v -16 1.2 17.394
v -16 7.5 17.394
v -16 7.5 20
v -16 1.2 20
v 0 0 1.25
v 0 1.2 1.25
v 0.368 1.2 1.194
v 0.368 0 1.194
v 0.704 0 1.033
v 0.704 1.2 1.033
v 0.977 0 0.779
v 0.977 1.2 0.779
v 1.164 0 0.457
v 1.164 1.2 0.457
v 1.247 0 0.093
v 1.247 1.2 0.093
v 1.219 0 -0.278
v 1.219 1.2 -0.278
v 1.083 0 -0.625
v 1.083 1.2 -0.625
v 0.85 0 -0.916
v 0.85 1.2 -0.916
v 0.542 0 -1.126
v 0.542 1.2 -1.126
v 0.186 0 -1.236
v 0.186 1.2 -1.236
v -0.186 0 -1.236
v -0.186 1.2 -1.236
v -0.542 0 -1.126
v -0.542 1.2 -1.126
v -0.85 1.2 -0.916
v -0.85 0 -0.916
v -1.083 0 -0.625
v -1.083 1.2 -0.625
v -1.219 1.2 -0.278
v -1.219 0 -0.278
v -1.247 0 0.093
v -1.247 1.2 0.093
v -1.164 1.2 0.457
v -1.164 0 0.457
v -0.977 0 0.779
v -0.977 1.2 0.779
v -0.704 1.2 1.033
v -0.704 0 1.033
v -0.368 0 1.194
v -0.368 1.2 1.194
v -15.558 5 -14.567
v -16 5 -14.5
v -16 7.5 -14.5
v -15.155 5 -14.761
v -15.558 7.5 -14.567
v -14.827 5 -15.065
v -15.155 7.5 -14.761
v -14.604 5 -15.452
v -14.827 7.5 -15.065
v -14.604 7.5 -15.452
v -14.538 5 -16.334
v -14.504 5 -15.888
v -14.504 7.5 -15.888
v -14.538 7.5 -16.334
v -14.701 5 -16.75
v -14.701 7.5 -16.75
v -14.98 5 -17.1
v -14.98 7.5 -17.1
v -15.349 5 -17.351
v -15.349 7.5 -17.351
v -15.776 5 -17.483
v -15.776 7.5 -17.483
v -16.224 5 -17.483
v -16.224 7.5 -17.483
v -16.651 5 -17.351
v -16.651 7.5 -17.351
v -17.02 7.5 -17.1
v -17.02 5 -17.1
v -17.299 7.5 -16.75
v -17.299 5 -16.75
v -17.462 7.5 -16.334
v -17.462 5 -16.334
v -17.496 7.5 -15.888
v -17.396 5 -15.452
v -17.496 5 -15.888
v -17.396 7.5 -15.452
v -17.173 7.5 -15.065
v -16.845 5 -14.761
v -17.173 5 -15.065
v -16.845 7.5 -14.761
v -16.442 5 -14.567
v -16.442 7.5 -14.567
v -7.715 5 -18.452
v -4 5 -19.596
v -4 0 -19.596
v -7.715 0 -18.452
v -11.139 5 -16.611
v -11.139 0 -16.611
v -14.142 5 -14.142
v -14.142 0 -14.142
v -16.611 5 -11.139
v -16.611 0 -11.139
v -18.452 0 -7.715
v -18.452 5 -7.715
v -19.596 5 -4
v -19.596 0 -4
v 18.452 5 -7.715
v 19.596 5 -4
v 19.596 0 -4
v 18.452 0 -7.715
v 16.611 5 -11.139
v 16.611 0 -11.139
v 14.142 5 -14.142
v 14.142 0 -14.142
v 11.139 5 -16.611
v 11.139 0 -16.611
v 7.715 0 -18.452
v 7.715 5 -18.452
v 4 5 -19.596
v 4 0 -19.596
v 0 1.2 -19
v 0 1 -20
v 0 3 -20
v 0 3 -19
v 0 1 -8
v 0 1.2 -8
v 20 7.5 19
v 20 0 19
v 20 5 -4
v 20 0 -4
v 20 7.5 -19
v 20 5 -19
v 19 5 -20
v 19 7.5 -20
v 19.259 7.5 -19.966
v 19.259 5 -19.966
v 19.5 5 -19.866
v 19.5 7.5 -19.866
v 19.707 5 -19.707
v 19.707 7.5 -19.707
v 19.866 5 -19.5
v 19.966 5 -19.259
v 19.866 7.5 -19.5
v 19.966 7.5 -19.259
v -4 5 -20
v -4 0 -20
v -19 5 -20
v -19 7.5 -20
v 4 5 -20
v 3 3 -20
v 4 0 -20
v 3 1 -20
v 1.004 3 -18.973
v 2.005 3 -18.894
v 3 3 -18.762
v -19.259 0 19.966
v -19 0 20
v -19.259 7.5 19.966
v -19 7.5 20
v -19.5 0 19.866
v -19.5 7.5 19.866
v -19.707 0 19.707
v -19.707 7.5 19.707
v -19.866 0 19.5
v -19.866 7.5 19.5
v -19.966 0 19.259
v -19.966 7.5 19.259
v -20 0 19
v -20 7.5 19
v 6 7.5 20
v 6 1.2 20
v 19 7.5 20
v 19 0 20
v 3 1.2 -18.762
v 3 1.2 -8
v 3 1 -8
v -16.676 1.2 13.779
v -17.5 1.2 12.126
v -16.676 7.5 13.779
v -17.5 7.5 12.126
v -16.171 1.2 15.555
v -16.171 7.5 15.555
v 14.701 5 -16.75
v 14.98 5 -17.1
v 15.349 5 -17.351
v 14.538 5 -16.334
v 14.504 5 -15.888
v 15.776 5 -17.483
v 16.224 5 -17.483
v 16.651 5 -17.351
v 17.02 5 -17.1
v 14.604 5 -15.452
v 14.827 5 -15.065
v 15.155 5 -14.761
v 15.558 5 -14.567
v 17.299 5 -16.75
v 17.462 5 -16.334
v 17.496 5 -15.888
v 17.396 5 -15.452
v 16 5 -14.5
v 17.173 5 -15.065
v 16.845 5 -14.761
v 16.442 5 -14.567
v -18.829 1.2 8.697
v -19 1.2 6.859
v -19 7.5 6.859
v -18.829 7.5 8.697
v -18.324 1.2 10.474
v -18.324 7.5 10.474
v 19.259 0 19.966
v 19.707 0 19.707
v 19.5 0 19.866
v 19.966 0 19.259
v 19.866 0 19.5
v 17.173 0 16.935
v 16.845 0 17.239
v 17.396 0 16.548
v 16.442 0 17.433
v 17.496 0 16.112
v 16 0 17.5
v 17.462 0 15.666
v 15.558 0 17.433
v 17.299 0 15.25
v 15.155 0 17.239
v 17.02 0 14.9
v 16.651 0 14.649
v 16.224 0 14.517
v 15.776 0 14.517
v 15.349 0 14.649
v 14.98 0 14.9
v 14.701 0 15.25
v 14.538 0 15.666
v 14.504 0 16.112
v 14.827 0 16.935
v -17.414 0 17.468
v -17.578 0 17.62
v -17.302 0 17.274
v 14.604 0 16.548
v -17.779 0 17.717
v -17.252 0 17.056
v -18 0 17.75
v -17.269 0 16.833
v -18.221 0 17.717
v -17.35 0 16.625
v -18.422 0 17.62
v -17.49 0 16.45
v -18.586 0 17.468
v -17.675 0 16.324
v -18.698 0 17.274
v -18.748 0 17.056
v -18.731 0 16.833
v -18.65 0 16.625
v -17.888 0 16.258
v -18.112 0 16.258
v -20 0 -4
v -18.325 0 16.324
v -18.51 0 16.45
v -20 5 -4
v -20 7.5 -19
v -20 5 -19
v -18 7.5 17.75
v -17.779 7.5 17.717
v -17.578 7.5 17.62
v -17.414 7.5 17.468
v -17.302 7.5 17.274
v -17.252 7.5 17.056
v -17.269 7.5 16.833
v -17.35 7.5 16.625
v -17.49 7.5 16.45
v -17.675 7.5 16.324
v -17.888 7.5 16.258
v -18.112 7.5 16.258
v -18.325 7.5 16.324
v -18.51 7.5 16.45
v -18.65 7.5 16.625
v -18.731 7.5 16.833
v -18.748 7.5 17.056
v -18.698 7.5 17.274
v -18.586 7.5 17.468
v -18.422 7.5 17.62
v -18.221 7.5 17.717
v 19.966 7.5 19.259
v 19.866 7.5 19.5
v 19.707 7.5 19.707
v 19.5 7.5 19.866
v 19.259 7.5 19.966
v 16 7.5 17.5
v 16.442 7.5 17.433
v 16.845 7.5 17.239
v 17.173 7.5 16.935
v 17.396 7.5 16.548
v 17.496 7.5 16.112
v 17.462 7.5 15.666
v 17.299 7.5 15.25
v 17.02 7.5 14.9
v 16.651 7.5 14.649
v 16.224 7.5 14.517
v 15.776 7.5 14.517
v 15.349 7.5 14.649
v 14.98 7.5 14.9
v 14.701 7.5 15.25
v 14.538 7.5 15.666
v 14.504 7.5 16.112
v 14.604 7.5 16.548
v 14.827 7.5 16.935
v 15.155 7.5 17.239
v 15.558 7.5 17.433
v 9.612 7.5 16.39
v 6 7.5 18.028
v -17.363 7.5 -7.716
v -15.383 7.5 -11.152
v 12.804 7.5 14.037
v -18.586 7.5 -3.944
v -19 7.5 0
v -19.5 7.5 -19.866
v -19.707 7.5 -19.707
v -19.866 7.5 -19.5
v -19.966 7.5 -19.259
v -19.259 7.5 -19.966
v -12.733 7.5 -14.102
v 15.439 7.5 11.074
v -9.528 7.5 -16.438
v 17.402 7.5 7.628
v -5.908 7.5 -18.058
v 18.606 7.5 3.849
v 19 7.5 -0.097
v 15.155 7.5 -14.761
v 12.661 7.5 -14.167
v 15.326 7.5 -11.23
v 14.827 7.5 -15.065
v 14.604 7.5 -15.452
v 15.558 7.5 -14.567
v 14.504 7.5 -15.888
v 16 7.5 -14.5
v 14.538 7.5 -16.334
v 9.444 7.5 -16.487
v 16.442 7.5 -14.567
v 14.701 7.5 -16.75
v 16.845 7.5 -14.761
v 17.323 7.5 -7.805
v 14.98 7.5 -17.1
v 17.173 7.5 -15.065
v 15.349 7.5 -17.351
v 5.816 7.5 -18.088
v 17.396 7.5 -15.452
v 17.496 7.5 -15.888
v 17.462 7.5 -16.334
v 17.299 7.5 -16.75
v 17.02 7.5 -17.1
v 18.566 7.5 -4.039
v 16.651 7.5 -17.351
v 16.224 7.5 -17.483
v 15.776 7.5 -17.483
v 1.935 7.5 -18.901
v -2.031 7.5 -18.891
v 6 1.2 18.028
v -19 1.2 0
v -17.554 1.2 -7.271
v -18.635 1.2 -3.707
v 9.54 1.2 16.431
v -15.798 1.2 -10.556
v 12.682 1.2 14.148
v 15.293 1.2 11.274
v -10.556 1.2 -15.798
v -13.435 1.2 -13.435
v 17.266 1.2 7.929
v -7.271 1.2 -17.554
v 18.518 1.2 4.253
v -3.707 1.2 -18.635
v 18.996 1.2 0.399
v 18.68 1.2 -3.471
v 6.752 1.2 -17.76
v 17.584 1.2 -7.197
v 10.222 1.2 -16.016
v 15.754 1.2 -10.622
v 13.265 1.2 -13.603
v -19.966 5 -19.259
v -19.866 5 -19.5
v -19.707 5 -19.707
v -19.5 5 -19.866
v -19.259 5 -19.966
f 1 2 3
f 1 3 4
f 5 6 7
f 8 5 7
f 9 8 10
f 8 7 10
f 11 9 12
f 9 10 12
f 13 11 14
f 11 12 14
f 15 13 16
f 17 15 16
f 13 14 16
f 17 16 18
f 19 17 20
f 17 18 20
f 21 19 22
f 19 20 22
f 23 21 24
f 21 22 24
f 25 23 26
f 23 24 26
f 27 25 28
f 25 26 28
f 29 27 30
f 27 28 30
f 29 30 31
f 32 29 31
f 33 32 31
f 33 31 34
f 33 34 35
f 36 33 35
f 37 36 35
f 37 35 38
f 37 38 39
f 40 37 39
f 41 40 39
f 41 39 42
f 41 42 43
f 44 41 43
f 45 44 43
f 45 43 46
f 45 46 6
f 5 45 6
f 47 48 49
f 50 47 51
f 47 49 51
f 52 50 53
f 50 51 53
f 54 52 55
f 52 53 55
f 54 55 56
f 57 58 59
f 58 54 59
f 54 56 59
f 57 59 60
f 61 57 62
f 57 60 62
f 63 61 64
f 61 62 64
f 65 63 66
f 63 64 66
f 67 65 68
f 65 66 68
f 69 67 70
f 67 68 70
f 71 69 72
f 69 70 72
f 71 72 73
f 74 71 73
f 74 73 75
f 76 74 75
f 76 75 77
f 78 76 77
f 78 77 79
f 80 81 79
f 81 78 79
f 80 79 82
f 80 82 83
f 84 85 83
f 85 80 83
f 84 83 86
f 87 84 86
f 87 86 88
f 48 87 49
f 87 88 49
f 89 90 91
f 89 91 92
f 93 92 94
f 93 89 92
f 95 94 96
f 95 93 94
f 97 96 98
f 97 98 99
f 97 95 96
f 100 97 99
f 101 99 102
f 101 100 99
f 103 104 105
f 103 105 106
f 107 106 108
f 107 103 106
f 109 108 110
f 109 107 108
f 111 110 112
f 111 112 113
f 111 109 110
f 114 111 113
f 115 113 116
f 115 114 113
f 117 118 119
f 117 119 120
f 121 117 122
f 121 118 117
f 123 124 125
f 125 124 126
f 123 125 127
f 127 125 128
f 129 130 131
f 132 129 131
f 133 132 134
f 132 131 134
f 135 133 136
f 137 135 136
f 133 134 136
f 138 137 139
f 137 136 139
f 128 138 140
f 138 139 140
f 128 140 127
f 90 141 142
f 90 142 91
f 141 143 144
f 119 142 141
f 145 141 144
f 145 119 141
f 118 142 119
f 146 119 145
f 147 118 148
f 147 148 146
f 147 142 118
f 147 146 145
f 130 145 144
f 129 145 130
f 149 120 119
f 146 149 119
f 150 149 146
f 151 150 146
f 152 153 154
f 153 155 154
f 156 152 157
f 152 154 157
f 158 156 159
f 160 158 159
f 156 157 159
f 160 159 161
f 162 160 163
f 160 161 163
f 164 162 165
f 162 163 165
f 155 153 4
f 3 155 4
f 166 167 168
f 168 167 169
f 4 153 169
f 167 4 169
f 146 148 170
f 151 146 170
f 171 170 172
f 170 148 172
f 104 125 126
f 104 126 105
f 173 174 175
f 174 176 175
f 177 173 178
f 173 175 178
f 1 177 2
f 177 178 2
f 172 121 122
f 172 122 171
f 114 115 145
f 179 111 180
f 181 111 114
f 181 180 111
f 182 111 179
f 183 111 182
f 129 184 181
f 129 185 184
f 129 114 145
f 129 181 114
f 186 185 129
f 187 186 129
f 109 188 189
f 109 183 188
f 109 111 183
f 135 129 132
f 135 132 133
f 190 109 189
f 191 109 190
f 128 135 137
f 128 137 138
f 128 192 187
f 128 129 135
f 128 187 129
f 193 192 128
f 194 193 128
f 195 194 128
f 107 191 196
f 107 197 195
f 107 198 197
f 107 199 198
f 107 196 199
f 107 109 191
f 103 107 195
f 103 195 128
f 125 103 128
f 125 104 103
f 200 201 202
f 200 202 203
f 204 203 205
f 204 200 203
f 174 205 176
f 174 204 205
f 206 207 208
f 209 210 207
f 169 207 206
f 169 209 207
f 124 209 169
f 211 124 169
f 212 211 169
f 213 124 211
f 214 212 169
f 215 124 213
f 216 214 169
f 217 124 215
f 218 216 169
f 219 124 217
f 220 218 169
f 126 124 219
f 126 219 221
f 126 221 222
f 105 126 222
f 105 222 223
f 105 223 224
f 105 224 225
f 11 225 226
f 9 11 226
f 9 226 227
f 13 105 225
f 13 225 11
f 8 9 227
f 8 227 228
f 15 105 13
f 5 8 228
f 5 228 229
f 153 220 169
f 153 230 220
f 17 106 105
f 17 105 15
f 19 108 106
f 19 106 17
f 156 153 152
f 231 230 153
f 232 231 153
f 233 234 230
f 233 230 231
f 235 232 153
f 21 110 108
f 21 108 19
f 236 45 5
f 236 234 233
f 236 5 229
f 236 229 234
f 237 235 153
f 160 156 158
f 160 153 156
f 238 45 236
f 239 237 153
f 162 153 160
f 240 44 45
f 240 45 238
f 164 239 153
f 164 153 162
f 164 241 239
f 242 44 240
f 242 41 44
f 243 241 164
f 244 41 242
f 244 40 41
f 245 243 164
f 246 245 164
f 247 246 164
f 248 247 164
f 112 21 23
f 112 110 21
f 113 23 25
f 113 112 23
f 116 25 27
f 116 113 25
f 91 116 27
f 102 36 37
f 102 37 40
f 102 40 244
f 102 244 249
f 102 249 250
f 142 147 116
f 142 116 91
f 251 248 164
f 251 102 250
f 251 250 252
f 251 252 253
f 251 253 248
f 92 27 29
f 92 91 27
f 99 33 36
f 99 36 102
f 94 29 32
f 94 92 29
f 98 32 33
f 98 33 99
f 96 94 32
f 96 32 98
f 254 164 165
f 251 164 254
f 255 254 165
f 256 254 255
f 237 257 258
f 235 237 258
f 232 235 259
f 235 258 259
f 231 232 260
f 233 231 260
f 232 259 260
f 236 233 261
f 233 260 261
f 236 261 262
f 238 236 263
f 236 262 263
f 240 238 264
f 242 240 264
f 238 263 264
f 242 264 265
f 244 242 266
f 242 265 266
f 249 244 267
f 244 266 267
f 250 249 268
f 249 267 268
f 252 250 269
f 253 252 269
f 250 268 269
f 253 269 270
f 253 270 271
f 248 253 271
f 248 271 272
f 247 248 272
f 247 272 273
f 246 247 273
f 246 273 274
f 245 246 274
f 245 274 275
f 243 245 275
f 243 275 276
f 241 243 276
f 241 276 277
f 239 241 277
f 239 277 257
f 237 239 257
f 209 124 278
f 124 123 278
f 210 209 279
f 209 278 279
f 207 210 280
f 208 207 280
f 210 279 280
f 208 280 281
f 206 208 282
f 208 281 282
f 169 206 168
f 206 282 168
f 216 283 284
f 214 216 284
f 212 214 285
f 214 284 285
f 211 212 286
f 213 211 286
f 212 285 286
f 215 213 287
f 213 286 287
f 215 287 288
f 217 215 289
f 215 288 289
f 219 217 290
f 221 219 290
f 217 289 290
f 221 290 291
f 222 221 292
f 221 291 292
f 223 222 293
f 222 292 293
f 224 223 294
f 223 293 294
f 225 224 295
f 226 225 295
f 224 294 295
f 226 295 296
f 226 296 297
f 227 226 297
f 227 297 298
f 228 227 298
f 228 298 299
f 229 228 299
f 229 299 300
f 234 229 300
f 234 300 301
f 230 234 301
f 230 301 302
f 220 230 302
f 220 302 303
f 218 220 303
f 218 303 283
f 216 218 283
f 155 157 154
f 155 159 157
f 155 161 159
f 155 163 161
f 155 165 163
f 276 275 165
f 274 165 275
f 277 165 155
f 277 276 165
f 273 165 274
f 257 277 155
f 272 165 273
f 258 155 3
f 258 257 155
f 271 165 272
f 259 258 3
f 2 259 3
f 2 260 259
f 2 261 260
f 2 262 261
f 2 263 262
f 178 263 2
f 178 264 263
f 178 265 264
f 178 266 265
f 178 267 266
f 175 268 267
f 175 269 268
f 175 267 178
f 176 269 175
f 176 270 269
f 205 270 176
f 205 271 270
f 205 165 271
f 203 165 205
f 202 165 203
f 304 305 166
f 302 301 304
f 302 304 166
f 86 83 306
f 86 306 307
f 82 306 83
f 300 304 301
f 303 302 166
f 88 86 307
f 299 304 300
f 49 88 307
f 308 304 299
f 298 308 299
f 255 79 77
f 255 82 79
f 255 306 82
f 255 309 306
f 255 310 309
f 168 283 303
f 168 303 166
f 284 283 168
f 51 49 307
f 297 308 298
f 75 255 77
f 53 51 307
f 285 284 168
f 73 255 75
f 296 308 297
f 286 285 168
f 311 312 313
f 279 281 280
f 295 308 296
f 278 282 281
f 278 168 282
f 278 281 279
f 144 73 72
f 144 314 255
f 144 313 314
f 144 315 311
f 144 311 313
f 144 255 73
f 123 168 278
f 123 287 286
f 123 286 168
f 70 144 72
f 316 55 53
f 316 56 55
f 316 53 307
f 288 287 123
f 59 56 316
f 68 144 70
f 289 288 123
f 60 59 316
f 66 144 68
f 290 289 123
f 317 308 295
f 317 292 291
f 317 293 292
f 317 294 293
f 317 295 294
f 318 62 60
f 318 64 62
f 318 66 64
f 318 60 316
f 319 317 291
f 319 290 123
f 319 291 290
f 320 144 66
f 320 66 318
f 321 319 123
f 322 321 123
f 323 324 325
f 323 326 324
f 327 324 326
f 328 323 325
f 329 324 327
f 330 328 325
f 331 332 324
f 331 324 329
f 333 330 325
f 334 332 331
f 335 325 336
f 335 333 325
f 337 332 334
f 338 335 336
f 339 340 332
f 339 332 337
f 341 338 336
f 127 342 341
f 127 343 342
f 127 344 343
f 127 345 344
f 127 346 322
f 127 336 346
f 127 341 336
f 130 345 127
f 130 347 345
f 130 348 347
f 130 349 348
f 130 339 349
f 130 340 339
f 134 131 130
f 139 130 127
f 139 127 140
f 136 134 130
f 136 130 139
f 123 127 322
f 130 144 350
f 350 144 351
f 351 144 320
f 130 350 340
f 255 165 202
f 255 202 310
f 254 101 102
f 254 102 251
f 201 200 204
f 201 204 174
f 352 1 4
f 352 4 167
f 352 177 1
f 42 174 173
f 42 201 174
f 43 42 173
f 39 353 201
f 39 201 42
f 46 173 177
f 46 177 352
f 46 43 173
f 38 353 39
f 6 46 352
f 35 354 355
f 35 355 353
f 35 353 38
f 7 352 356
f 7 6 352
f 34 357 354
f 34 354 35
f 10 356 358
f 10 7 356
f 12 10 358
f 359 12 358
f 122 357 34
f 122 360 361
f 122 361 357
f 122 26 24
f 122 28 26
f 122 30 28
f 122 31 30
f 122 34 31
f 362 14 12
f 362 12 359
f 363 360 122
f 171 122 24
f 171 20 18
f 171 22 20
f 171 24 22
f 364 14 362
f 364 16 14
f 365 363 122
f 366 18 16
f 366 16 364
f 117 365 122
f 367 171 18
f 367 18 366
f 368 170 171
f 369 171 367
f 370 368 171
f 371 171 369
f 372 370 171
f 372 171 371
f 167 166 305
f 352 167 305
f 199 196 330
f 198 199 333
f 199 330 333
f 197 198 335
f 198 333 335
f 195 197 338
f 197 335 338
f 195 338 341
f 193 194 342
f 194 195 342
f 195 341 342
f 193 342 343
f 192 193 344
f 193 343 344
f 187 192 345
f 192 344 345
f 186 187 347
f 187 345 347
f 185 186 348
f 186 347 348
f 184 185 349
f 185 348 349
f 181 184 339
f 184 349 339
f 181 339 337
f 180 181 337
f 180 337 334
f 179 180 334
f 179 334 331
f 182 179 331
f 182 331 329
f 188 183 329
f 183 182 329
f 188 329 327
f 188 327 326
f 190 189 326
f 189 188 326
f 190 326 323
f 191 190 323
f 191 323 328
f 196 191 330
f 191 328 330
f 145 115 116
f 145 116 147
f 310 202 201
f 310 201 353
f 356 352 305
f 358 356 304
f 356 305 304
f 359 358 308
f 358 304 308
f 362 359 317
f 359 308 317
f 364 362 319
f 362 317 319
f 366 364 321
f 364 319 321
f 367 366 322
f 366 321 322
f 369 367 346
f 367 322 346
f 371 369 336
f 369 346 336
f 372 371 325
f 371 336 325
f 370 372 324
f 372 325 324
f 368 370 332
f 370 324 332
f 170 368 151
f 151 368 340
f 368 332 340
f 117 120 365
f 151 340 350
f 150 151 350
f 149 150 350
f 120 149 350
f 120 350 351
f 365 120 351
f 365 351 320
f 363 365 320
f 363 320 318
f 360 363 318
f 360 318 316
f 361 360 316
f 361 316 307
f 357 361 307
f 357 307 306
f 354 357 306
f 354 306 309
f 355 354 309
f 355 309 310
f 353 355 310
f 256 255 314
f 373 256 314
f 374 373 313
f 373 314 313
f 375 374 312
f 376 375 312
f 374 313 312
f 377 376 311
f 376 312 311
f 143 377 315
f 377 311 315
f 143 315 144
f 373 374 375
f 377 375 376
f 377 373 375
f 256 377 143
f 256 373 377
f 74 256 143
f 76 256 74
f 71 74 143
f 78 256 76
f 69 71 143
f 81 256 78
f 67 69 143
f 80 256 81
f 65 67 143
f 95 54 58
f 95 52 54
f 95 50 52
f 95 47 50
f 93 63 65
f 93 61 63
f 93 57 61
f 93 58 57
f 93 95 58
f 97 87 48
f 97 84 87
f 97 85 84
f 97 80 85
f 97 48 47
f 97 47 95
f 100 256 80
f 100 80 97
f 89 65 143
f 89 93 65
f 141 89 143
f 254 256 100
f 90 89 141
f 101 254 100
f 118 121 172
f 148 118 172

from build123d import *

# Parameters (mm, degrees)
SKETCH1_W               = 40
SKETCH1_H               = 40
BOSS_EXTRUDE1_DEPTH     = 7.5
SKETCH2_R               = 19
CUT_EXTRUDE1_DEPTH      = 6.3
SKETCH3_W               = 25
SKETCH3_H               = 20
CUT_EXTRUDE2_DEPTH      = 6.3
SKETCH4_R               = 1.5
CUT_EXTRUDE3_DEPTH      = 30.261749777
SKETCH6_R               = 1.25
CUT_EXTRUDE5_DEPTH      = 29.977404991
SKETCH7_W               = 3
SKETCH7_H               = 6
BOSS_EXTRUDE2_DEPTH     = 6.3
FILLET1_R               = 10
FILLET2_R               = 10
SKETCH8_R               = 0.75
CUT_EXTRUDE6_DEPTH      = 30.261749777
BOSS_EXTRUDE3_DEPTH     = 5
FILLET3_R               = 1
CUT_EXTRUDE7_START      = -1
SKETCH10_W              = 3
SKETCH10_H              = 12
CUT_EXTRUDE7_DEPTH      = 2
CUT_EXTRUDE8_DEPTH      = 33.882366095
CUT_EXTRUDE8_DEPTH_BACK = 33.882366095
SKETCH11_W              = 5
SKETCH11_H              = 7.5
CUT_EXTRUDE9_START      = -5
SKETCH12_R              = 1.5
CUT_EXTRUDE9_DEPTH      = 5


with BuildPart() as part:
    # Sketch1 → Boss-Extrude1 (new body)
    with BuildSketch(Plane(origin=(0, 0, 0), x_dir=(1, 0, 0), z_dir=(0, 1, 0))):
        Rectangle(SKETCH1_W, SKETCH1_H)
    extrude(amount=BOSS_EXTRUDE1_DEPTH)

    # Sketch2 → Cut-Extrude1 (cut)
    with BuildSketch(Plane(origin=(0, 7.5, 0), x_dir=(1, 0, 0), z_dir=(0, 1, 0))):
        with Locations(Location((0, 0, 0), (0, 0, 270))):
            Circle(SKETCH2_R)
    extrude(amount=-CUT_EXTRUDE1_DEPTH, mode=Mode.SUBTRACT)

    # Sketch3 → Cut-Extrude2 (cut)
    with BuildSketch(Plane(origin=(0, 7.5, 0), x_dir=(1, 0, 0), z_dir=(0, 1, 0))):
        with Locations((-6.5, -10)):
            Rectangle(SKETCH3_W, SKETCH3_H)
    extrude(amount=-CUT_EXTRUDE2_DEPTH, mode=Mode.SUBTRACT)

    # Sketch4 → Cut-Extrude3 (cut, through all)
    with BuildSketch(Plane(origin=(0, 7.5, 0), x_dir=(1, 0, 0), z_dir=(0, 1, 0))):
        with Locations(Location((-16, 16, 0), (0, 0, 270))):
            Circle(SKETCH4_R)
        with Locations(Location((16, 16, 0), (0, 0, 270))):
            Circle(SKETCH4_R)
        with Locations(Location((16, -16, 0), (0, 0, 270))):
            Circle(SKETCH4_R)
    extrude(amount=-CUT_EXTRUDE3_DEPTH, mode=Mode.SUBTRACT)

    # Sketch6 → Cut-Extrude5 (cut, through all)
    with BuildSketch(Plane(origin=(0, 1.2, 0), x_dir=(1, 0, 0), z_dir=(0, 1, 0))):
        with Locations(Location((0, 0, 0), (0, 0, 270))):
            Circle(SKETCH6_R)
    extrude(amount=-CUT_EXTRUDE5_DEPTH, mode=Mode.SUBTRACT)

    # Sketch7 → Boss-Extrude2 (add)
    with BuildSketch(Plane(origin=(0, 1.2, 0), x_dir=(1, 0, 0), z_dir=(0, 1, 0))):
        with Locations((-17.5, -17)):
            Rectangle(SKETCH7_W, SKETCH7_H)
    extrude(amount=BOSS_EXTRUDE2_DEPTH)

    # Fillet1
    # the kernel refuses this fillet: 10 mm, written as the material it adds along each edge
    with BuildSketch(Plane(origin=(-19, 1.2, 14), x_dir=(0, 0, -1), z_dir=(0, 1, 0))) as fillet1_piece_1:
        with BuildLine():
            CenterArc((7.141428429, -10), FILLET1_R, 90, 45.572995999)
            Line((0, -3), (-0.142828569, -2.86))
            ThreePointArc((-0.142828569, -2.86), (-0.2, -1.5), (-0.2, 0))
            Line((-0.2, 0), (0, 0.2))
            Line((0, 0.2), (7.141428429, 0.2))
            Line((7.141428429, 0.2), (7.141428429, 0))
        make_face()
    extrude(amount=6.3)

    # Fillet2
    fillet2_edges = [part.edges().sort_by_distance(p)[0] for p in [
        (-16, 4.35, 14),
    ]]
    fillet(fillet2_edges, radius=FILLET2_R)

    # Sketch8 → Cut-Extrude6 (cut, through all)
    with BuildSketch(Plane(origin=(0, 7.5, 0), x_dir=(1, 0, 0), z_dir=(0, 1, 0))):
        with Locations(Location((-18, -17, 0), (0, 0, 270))):
            Circle(SKETCH8_R)
    extrude(amount=-CUT_EXTRUDE6_DEPTH, mode=Mode.SUBTRACT)

    # Sketch9 → Boss-Extrude3 (add)
    with BuildSketch(Plane.XY.offset(20)):
        Polygon((-18, 7.5), (-16, 7.5), (-16, 1.2), (6, 1.2), (6, 7.5), (8, 7.5), (8, 0), (-18, 0), align=None)
    extrude(amount=BOSS_EXTRUDE3_DEPTH)

    # Fillet3
    fillet3_edges = [part.edges().sort_by_distance(p)[0] for p in [
        (20, 3.75, 20),
        (-20, 3.75, 20),
        (-20, 3.75, -20),
        (20, 3.75, -20),
    ]]
    fillet(fillet3_edges, radius=FILLET3_R)

    # Sketch10 → Cut-Extrude7 (cut)
    with BuildSketch(Plane.XZ.offset(CUT_EXTRUDE7_START)):
        with Locations((1.5, -14)):
            Rectangle(SKETCH10_W, SKETCH10_H)
    extrude(amount=-CUT_EXTRUDE7_DEPTH, mode=Mode.SUBTRACT)

    # Sketch11 → Cut-Extrude8 (cut, two sides: drawn at the far end of the back side and taken through both)
    with BuildSketch(Plane(origin=(0, 0, 0), x_dir=(0, 0, -1), z_dir=(1, 0, 0)).offset(-CUT_EXTRUDE8_DEPTH_BACK)):
        with Locations((-22.5, 3.75)):
            Rectangle(SKETCH11_W, SKETCH11_H)
    extrude(amount=CUT_EXTRUDE8_DEPTH + CUT_EXTRUDE8_DEPTH_BACK, mode=Mode.SUBTRACT)

    # Sketch12 → Cut-Extrude9 (cut)
    # profile 1 of 2: a face of its own
    with BuildSketch(Plane.XZ.offset(CUT_EXTRUDE9_START)):
        with BuildLine():
            Line((20, -4), (19.595917942, -4))
            ThreePointArc((19.595917942, -4), (14.142135624, -14.142135624), (4, -19.595917942))
            Line((4, -19.595917942), (4, -20))
            Line((4, -20), (19, -20))
            ThreePointArc((19, -20), (19.707106781, -19.707106781), (20, -19))
            Line((20, -19), (20, -4))
        make_face()
        with Locations(Location((16, -16, 0), (0, 0, 90))):
            Circle(SKETCH12_R, mode=Mode.SUBTRACT)
    # profile 2 of 2: a face of its own
    with BuildSketch(Plane.XZ.offset(CUT_EXTRUDE9_START)):
        with BuildLine():
            Line((-4, -20), (-4, -19.595917942))
            ThreePointArc((-4, -19.595917942), (-14.142135624, -14.142135624), (-19.595917942, -4))
            Line((-19.595917942, -4), (-20, -4))
            Line((-20, -4), (-20, -19))
            ThreePointArc((-20, -19), (-19.707106781, -19.707106781), (-19, -20))
            Line((-19, -20), (-4, -20))
        make_face()
        with Locations(Location((-16, -16, 0), (0, 0, 90))):
            Circle(SKETCH12_R, mode=Mode.SUBTRACT)
    extrude(amount=CUT_EXTRUDE9_DEPTH, mode=Mode.SUBTRACT)


solid = part.part
